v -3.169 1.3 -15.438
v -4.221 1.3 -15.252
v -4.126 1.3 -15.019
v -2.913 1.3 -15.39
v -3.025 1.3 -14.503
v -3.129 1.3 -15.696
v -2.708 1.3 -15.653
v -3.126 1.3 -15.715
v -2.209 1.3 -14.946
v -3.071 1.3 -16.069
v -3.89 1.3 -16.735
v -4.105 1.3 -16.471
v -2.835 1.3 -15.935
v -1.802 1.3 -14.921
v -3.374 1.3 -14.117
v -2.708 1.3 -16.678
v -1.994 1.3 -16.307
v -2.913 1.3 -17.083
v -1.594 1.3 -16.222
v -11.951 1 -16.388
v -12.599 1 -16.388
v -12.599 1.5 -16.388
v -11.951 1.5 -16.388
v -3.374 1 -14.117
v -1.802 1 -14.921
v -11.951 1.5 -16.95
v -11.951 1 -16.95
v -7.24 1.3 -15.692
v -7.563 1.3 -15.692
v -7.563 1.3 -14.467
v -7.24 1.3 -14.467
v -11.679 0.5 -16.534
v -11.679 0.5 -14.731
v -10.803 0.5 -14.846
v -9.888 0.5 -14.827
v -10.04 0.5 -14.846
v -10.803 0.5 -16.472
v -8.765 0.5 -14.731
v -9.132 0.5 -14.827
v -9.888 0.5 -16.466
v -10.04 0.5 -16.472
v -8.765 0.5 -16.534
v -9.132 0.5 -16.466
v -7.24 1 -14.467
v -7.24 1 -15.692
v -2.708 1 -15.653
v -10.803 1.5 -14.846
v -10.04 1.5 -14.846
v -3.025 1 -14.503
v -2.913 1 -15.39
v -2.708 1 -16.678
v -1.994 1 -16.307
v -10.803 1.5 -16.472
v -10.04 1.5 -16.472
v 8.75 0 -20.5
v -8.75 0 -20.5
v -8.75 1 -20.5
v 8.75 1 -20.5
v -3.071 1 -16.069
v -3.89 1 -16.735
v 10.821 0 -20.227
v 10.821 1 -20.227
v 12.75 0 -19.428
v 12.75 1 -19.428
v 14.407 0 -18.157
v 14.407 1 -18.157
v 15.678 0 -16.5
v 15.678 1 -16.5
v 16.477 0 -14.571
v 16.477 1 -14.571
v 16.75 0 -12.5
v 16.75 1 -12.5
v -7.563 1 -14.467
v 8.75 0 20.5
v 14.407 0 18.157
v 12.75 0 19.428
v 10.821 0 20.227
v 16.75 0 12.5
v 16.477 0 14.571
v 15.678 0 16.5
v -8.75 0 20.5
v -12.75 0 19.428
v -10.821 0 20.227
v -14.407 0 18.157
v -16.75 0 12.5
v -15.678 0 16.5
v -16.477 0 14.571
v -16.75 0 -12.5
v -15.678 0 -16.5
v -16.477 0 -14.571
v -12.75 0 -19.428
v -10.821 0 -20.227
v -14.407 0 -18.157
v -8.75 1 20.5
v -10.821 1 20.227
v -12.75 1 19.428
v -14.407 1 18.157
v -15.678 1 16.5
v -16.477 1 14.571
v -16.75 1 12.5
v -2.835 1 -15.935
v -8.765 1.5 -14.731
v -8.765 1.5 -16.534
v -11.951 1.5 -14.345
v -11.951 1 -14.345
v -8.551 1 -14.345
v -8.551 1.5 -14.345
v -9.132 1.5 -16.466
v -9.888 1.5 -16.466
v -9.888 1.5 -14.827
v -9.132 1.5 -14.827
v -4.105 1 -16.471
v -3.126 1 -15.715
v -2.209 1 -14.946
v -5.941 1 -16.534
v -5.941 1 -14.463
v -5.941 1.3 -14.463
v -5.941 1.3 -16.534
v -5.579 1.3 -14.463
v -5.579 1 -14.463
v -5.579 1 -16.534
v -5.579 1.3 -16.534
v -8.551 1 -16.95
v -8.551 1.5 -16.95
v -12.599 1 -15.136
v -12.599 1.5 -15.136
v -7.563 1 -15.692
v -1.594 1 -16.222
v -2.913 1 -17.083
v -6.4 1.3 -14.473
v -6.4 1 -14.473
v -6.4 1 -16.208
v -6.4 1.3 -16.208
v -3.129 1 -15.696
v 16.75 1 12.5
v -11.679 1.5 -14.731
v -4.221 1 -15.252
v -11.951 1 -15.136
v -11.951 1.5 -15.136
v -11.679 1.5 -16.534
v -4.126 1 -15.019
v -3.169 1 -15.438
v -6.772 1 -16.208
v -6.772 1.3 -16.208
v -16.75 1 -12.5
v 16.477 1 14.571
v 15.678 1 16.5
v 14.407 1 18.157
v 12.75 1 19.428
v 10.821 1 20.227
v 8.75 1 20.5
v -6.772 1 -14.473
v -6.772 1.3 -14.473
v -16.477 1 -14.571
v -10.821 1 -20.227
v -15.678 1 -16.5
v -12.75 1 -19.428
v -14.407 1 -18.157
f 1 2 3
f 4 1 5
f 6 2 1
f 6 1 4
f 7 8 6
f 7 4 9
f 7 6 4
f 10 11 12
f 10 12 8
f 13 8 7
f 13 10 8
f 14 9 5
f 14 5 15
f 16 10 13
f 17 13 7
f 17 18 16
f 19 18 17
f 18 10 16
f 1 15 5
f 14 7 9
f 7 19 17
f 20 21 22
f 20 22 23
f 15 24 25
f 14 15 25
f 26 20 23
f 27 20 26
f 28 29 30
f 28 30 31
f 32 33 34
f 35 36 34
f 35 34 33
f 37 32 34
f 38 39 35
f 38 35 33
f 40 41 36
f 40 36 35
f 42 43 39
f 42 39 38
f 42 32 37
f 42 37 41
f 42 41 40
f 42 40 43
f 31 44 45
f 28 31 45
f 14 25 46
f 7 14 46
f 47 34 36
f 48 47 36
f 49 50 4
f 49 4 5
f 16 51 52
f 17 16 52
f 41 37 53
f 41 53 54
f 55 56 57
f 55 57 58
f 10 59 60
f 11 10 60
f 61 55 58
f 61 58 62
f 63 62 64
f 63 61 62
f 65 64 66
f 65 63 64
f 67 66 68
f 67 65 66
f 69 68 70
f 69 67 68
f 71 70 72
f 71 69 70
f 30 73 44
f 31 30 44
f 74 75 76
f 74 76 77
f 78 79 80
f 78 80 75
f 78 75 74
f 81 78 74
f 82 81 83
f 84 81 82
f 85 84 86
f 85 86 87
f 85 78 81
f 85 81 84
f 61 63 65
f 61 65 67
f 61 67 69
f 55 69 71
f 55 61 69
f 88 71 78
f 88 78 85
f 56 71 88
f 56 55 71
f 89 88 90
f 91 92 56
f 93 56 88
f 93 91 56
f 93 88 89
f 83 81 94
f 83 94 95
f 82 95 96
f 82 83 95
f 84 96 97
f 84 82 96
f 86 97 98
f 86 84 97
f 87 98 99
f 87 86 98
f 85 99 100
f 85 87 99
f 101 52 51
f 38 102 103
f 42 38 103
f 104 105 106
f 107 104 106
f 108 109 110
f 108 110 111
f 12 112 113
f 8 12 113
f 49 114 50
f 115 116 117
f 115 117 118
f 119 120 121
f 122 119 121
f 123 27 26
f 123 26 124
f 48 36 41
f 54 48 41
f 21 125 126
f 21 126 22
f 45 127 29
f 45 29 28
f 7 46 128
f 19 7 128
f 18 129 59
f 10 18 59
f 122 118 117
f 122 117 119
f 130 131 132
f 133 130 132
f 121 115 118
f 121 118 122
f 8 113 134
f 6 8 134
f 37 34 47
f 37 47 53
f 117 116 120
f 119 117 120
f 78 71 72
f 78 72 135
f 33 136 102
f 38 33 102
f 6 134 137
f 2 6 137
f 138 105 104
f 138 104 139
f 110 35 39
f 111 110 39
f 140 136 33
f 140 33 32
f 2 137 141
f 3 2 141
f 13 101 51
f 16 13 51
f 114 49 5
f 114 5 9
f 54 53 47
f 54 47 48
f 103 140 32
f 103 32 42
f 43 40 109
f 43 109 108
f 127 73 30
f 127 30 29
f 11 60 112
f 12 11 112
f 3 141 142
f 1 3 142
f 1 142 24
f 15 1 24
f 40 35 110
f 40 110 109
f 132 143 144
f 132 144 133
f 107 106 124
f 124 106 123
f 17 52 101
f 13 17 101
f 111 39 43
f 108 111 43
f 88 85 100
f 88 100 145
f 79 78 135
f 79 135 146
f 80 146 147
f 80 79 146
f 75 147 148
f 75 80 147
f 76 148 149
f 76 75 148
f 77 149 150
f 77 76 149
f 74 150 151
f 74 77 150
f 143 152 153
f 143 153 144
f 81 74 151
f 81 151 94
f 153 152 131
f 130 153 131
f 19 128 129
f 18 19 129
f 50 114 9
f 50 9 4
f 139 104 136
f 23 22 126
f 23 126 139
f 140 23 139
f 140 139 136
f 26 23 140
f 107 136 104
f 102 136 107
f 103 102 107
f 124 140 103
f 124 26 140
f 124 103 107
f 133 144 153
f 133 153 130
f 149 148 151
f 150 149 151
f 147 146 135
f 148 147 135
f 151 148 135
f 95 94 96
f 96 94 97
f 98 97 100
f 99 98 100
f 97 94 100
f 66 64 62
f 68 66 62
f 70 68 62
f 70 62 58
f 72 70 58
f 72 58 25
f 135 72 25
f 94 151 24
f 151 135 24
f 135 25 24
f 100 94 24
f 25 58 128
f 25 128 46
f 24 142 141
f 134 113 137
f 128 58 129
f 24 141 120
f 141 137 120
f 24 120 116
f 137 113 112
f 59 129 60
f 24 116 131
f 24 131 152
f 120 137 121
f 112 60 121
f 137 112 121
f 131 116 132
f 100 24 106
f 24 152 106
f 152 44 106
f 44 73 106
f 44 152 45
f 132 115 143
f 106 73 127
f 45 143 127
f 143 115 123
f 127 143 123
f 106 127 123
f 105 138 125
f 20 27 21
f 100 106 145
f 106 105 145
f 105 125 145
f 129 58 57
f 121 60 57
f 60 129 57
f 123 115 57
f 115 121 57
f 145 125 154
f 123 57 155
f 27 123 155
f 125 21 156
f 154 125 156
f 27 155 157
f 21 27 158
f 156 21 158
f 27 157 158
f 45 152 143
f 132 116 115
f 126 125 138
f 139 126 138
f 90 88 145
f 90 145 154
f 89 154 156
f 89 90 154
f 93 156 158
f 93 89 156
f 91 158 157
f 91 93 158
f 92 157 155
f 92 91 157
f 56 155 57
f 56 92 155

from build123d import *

# Parameters (mm, degrees)
BOSS_EXTRUDE1_DEPTH = 1
SKETCH2_W           = 3.399574798
SKETCH2_H           = 2.604207363
SKETCH2_W_2         = 0.648007004
SKETCH2_H_2         = 1.252018983
BOSS_EXTRUDE2_DEPTH = 0.5
SKETCH3_W           = 2.913906285
SKETCH3_H           = 1.803051724
CUT_EXTRUDE1_DEPTH  = 1
SKETCH4_W           = 0.755256807
SKETCH4_H           = 1.639917717
SKETCH4_W_2         = 0.763724631
SKETCH4_H_2         = 1.626197377
BOSS_EXTRUDE3_DEPTH = 1
SKETCH6_W           = 0.323055787
SKETCH6_H           = 1.224923668
SKETCH6_W_2         = 0.371772392
SKETCH6_H_2         = 1.735099538
SKETCH6_W_3         = 0.361493721
SKETCH6_H_3         = 2.070814397
BOSS_EXTRUDE4_DEPTH = 0.3
BOSS_EXTRUDE8_DEPTH = 0.3


with BuildPart() as part:
    # Sketch1 → Boss-Extrude1 (new body)
    with BuildSketch(Plane(origin=(0, 0, 0), x_dir=(1, 0, 0), z_dir=(0, 1, 0))):
        with BuildLine():
            Line((-8.75, 20.5), (8.75, 20.5))
            ThreePointArc((8.75, 20.5), (14.406854249, 18.156854249), (16.75, 12.5))
            Line((16.75, 12.5), (16.75, -12.5))
            ThreePointArc((16.75, -12.5), (14.406854249, -18.156854249), (8.75, -20.5))
            Line((8.75, -20.5), (-8.75, -20.5))
            ThreePointArc((-8.75, -20.5), (-14.406854249, -18.156854249), (-16.75, -12.5))
            Line((-16.75, -12.5), (-16.75, 12.5))
            ThreePointArc((-16.75, 12.5), (-14.406854249, 18.156854249), (-8.75, 20.5))
        make_face()
    extrude(amount=BOSS_EXTRUDE1_DEPTH)

    # Sketch2 → Boss-Extrude2 (add)
    with BuildSketch(Plane(origin=(0, 1, 0), x_dir=(1, 0, 0), z_dir=(0, 1, 0))):
        with Locations((-10.250837729, 15.647459094)):
            Rectangle(SKETCH2_W, SKETCH2_H)
        with Locations((-12.27462863, 15.762007905)):
            Rectangle(SKETCH2_W_2, SKETCH2_H_2)
    extrude(amount=BOSS_EXTRUDE2_DEPTH)

    # Sketch3 → Cut-Extrude1 (cut)
    with BuildSketch(Plane(origin=(0, 1.5, 0), x_dir=(1, 0, 0), z_dir=(0, 1, 0))):
        with Locations((-10.221842574, 15.632123632)):
            Rectangle(SKETCH3_W, SKETCH3_H)
    extrude(amount=-CUT_EXTRUDE1_DEPTH, mode=Mode.SUBTRACT)

    # Sketch4 → Boss-Extrude3 (add)
    with BuildSketch(Plane(origin=(0, 0.5, 0), x_dir=(1, 0, 0), z_dir=(0, 1, 0))):
        with Locations((-9.510068413, 15.646512941)):
            Rectangle(SKETCH4_W, SKETCH4_H)
        with Locations((-10.421480669, 15.658650775)):
            Rectangle(SKETCH4_W_2, SKETCH4_H_2)
    extrude(amount=BOSS_EXTRUDE3_DEPTH)

    # Sketch6 → Boss-Extrude4 (add)
    with BuildSketch(Plane(origin=(0, 1, 0), x_dir=(1, 0, 0), z_dir=(0, 1, 0))):
        with Locations((-7.401507334, 15.079514795)):
            Rectangle(SKETCH6_W, SKETCH6_H)
        with Locations((-6.585633976, 15.340608205)):
            Rectangle(SKETCH6_W_2, SKETCH6_H_2)
        with Locations((-5.759844772, 15.498462338)):
            Rectangle(SKETCH6_W_3, SKETCH6_H_3)
    extrude(amount=BOSS_EXTRUDE4_DEPTH)

    # Sketch7 → Boss-Extrude8 (add)
    with BuildSketch(Plane(origin=(0, 1, 0), x_dir=(1, 0, 0), z_dir=(0, 1, 0))):
        Polygon((-2.913348429, 17.083305865), (-3.070822573, 16.069437014), (-3.890044364, 16.734757778), (-4.10463288, 16.470530961), (-3.125803438, 15.71545264), (-3.128811108, 15.696088298), (-4.220670364, 15.251854963), (-4.125911477, 15.018951756), (-3.168901436, 15.437973959), (-3.374102624, 14.116823145), (-1.801517614, 14.921145153), (-2.70763201, 15.653067043), (-1.594376902, 16.222457937), align=None)
        Polygon((-2.913348429, 15.389877589), (-3.025116607, 14.50250057), (-2.208716049, 14.94618908), align=None, mode=Mode.SUBTRACT)
        Polygon((-2.834687196, 15.935171595), (-2.70763201, 16.678238629), (-1.993867712, 16.306705112), align=None, mode=Mode.SUBTRACT)
    extrude(amount=BOSS_EXTRUDE8_DEPTH)


solid = part.part
